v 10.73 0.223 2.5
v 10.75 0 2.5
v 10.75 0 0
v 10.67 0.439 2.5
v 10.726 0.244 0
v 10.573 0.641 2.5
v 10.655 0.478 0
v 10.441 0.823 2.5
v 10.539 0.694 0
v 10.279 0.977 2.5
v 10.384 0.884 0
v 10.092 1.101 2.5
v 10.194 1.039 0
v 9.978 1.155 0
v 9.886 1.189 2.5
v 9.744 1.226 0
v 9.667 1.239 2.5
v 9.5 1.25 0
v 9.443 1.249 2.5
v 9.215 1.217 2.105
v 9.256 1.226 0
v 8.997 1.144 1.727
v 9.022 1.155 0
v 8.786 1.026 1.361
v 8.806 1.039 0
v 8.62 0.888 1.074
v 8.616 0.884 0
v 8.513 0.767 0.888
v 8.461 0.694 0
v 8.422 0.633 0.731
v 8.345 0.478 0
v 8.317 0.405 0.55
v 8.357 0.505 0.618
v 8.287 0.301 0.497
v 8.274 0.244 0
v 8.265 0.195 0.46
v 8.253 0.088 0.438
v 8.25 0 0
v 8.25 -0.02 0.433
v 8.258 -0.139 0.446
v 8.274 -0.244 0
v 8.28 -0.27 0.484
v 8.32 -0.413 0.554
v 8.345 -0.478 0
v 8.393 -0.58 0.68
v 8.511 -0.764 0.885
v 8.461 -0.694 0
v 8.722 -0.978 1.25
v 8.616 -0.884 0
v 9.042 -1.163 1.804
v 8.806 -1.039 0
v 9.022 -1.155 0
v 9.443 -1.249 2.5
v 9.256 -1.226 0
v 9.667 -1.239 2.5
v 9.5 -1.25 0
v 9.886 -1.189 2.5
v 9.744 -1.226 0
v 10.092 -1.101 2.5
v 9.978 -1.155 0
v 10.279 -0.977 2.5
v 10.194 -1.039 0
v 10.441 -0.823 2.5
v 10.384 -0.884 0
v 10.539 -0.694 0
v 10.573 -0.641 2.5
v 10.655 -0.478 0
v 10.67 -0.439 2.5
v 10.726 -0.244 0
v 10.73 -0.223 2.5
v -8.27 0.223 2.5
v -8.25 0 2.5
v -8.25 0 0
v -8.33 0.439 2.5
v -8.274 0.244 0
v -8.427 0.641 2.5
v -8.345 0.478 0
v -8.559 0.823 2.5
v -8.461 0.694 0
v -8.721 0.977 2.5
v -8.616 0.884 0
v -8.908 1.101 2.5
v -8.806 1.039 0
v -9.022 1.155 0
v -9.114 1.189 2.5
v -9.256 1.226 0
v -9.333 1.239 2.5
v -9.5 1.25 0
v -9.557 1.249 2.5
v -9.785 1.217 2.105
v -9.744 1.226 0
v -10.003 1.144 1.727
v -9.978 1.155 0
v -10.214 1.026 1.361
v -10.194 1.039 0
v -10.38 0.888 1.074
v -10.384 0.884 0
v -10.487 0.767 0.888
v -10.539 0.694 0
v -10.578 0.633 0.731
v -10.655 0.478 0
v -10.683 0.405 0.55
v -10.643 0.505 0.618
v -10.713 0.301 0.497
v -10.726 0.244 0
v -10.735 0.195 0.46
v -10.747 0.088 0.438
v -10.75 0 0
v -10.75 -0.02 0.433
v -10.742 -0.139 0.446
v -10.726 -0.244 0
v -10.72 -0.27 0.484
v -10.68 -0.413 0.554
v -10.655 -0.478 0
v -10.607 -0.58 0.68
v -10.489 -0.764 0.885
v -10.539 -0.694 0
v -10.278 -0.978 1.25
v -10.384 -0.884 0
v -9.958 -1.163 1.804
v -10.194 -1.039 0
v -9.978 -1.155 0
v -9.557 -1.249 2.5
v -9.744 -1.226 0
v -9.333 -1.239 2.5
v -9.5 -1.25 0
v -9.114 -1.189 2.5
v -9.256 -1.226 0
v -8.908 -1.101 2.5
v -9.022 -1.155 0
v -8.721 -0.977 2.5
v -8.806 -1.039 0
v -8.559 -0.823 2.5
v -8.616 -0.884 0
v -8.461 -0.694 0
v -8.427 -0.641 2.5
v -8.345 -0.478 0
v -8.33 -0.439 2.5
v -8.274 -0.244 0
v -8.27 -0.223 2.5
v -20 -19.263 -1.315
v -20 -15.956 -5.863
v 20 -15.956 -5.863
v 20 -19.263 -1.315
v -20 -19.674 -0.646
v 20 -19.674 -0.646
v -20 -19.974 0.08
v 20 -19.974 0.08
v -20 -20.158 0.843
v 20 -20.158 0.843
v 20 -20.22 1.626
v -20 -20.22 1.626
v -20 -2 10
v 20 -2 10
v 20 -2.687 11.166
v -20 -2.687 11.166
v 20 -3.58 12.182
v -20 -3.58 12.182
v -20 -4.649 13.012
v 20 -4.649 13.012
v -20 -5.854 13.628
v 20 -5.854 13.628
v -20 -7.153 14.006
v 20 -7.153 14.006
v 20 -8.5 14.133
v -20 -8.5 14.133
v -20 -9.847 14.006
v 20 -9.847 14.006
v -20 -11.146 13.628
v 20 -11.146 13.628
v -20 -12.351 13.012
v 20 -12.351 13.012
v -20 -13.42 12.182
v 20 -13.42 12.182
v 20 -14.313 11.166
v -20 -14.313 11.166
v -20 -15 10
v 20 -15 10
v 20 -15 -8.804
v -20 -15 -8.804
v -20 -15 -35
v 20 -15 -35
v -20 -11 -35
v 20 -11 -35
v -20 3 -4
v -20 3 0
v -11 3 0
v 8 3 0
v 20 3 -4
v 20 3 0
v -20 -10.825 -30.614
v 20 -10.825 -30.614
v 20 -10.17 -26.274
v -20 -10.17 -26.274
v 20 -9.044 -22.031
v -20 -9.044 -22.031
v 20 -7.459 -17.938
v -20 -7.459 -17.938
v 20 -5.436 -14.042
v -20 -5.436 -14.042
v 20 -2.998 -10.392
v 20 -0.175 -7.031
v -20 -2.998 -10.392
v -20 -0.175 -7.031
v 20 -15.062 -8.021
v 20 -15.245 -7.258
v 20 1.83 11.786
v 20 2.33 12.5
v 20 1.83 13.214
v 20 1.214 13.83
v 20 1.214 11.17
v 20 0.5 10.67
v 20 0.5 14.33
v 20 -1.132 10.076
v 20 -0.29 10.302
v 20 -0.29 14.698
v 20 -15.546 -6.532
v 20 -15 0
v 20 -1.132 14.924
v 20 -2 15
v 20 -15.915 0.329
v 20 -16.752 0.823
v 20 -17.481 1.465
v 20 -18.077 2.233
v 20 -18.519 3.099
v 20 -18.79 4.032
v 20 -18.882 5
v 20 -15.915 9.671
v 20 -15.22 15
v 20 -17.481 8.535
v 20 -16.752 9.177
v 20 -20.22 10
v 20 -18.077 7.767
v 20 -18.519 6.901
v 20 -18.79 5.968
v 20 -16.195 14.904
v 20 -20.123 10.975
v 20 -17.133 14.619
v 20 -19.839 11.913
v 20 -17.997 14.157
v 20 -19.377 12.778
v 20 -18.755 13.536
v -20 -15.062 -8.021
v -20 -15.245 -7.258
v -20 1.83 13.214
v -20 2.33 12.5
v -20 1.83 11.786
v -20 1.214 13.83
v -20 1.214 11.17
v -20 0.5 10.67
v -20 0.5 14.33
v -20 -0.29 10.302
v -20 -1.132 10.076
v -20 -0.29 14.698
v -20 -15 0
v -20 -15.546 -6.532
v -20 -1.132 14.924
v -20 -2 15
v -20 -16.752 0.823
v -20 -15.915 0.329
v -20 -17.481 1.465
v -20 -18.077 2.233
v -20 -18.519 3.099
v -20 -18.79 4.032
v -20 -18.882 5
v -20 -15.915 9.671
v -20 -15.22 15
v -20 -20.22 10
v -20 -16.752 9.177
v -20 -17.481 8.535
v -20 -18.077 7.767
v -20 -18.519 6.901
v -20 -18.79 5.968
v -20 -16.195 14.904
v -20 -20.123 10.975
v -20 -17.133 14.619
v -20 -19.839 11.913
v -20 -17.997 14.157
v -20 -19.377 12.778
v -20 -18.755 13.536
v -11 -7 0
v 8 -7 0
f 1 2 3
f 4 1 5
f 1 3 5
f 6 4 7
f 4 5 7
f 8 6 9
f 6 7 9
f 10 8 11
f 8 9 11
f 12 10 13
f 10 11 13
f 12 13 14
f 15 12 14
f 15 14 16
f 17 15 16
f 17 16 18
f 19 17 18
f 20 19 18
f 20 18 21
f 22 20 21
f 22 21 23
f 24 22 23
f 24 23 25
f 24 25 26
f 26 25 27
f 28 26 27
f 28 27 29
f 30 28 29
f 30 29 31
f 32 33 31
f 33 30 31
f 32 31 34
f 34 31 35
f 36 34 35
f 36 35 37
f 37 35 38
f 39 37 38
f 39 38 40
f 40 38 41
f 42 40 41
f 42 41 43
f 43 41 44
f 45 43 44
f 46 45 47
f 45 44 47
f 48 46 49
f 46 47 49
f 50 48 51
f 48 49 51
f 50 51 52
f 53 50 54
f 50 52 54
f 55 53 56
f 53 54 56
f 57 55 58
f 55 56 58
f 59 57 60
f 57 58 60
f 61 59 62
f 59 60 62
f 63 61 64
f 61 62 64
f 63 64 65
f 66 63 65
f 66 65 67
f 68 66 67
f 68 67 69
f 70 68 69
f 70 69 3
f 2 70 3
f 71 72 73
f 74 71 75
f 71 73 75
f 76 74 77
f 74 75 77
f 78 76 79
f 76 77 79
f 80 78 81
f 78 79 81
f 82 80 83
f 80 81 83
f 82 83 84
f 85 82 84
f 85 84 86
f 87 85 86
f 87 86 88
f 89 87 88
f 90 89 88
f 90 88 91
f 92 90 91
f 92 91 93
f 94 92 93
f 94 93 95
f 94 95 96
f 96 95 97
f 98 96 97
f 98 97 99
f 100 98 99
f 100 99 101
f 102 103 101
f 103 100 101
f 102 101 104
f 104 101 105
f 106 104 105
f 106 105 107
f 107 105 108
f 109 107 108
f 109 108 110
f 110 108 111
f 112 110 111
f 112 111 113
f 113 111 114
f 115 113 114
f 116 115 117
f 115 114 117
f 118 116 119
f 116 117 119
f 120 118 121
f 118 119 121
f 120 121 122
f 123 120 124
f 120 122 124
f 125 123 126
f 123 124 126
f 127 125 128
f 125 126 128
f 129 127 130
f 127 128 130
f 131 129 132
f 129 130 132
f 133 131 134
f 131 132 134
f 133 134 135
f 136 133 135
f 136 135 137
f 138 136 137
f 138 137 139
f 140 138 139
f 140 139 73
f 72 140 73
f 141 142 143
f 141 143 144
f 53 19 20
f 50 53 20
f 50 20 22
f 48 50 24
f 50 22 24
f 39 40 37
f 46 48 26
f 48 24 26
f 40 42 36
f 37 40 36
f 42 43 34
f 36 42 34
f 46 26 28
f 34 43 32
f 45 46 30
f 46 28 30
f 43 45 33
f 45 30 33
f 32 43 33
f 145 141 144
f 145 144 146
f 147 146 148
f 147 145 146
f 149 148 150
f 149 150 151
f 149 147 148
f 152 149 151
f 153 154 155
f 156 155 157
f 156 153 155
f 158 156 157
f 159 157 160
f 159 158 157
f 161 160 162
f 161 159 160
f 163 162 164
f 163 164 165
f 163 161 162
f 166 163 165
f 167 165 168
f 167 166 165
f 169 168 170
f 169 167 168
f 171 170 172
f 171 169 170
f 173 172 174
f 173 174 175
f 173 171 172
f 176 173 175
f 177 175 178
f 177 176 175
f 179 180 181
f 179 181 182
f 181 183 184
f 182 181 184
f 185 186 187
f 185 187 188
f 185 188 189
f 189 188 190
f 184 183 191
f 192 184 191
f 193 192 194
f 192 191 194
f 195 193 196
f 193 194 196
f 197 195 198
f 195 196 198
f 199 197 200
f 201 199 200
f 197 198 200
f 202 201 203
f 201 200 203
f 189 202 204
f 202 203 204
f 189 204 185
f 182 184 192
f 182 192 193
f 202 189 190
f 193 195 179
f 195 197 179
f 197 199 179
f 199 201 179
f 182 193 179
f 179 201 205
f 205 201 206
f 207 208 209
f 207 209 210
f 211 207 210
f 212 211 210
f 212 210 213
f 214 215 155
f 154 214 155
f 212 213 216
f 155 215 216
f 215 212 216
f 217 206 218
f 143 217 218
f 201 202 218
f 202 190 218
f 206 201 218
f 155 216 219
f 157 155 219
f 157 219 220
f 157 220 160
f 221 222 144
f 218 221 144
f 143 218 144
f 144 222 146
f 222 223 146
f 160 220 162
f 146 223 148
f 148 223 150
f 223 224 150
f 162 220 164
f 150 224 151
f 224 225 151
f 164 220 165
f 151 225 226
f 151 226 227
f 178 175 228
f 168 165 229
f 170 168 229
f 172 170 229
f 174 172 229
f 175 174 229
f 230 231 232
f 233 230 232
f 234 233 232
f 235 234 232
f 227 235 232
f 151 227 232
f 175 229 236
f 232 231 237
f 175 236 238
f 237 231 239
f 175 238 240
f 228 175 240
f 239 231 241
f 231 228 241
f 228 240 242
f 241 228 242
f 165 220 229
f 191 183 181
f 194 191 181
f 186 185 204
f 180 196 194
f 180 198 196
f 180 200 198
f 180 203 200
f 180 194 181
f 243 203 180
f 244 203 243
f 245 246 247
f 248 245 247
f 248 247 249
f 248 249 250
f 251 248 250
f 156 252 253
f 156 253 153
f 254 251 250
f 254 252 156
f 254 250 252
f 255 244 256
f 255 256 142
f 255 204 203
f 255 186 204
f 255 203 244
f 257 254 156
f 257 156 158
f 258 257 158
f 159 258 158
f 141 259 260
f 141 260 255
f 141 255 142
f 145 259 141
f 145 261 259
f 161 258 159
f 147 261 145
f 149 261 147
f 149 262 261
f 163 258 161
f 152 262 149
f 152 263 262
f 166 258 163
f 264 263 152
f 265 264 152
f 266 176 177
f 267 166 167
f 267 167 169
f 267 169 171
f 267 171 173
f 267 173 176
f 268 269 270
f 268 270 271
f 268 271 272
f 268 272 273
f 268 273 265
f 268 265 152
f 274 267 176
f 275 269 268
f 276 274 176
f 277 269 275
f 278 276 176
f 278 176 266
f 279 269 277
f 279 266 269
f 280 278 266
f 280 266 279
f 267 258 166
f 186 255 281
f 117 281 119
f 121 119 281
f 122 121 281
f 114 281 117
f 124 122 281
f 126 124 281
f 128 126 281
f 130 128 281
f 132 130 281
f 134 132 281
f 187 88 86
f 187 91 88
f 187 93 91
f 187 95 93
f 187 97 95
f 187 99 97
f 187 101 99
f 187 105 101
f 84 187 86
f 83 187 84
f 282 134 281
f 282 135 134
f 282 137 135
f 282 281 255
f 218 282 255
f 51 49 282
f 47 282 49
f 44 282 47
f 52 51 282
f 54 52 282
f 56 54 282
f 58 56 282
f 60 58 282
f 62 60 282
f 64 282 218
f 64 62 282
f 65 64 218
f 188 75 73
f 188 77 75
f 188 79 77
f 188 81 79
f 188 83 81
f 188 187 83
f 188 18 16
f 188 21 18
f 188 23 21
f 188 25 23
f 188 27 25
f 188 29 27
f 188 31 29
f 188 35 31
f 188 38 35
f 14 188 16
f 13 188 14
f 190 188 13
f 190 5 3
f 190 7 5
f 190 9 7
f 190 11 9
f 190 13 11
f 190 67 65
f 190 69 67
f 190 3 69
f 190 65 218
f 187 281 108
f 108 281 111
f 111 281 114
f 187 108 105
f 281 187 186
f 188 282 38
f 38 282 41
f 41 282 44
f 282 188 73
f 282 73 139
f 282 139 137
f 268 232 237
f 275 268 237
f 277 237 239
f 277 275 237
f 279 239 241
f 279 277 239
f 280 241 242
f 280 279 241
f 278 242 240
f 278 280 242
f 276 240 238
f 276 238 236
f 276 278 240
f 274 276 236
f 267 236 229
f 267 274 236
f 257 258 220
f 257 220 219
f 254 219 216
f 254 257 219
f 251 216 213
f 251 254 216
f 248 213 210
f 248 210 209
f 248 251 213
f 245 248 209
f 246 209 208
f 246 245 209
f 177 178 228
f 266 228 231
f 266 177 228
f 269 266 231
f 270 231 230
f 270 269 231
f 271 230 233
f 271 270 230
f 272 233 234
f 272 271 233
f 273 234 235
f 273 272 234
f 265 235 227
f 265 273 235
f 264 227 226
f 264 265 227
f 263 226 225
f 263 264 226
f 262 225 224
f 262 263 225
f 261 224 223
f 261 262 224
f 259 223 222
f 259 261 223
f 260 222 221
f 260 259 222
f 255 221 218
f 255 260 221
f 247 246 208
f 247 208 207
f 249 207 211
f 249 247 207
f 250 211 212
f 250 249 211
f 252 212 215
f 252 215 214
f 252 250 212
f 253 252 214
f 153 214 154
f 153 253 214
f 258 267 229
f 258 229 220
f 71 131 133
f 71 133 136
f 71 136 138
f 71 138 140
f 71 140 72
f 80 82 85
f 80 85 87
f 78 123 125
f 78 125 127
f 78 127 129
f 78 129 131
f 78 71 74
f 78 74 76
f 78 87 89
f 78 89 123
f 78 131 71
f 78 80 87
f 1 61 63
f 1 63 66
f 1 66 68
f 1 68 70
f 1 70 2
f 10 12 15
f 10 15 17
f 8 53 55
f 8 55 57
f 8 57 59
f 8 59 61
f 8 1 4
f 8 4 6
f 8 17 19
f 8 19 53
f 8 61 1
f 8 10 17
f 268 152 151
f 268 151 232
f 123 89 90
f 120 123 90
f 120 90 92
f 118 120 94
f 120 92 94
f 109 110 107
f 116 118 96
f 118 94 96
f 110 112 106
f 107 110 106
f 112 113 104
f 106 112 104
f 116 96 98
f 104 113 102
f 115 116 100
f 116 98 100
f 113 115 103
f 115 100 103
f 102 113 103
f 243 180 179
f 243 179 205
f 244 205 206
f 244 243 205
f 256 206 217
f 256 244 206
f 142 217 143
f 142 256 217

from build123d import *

# Parameters (mm, degrees)
F0_R         = 1.25
F1_DEPTH     = 2.5
F2_W         = 40
F2_H         = 18
F3_DEPTH     = 35
F5_DEPTH     = 40.001
F7_DEPTH     = 40
F9_DEPTH     = 10
F10_T1_DEPTH = 40
F10_T3_DEPTH = 65
F10_T5_DEPTH = 48.1285235511


# Not quite as in the source:
# - a fillet or chamfer that OpenCascade refuses, or shapes differently, is made with other operations: its cross-section is extruded or revolved along the edge and cut away or added


with BuildPart() as f1:
    # F0 (on Top) → F1 (new body)
    with BuildSketch(Plane.XY):
        with Locations((-9.5, 0)):
            Circle(F0_R)
    extrude(amount=F1_DEPTH)



with BuildPart() as f1b:
    # F0 (on Top) → F1, piece 2 (new body)
    with BuildSketch(Plane.XY):
        with Locations((9.5, 0)):
            Circle(F0_R)
    extrude(amount=F1_DEPTH)


with BuildPart() as f1_1:
    add(f1.part)

    add(f1b.part)  # F3 merges F1b
    # F2 (on Top) → F3 (join)
    with BuildSketch(Plane.XY):
        with Locations((0, -6)):
            Rectangle(F2_W, F2_H)
    extrude(amount=-F3_DEPTH)

    # F4 (on face) → F5 (cut, through all)
    with BuildSketch(Plane(origin=(-20, 0, 0), x_dir=(0, -1, 0), z_dir=(-1, 0, 0))):
        with BuildLine():
            Line((-3, -35), (11, -35))
            ThreePointArc((11, -35), (7.459306232, -17.9377326694), (-3, -4))
            Line((-3, -4), (-3, -35))
        make_face()
    extrude(amount=-F5_DEPTH, mode=Mode.SUBTRACT)

    # F6 (on face) → F7 (join)
    with BuildSketch(Plane(origin=(-20, 0, 0), x_dir=(0, -1, 0), z_dir=(-1, 0, 0))):
        with BuildLine():
            Line((-3, 10), (2, 10))
            ThreePointArc((2, 10), (8.5, 14.1331594945), (15, 10))
            ThreePointArc((15, 10), (18.881651405, 5), (15, 0))
            Line((15, 0), (15, -7.1779969148))
            Line((15, -7.1779969148), (20.2195104212, 0))
            Line((20.2195104212, 0), (20.2195104212, 15))
            Line((20.2195104212, 15), (-3, 15))
            Line((-3, 15), (-3, 10))
        make_face()
    extrude(amount=-F7_DEPTH)

    # F8 (on face) → F9 (cut)
    with BuildSketch(Plane(origin=(0, 3, 0), x_dir=(-1, 0, 0), z_dir=(0, 1, 0))):
        Polygon((9.1120566488, 3.2700138061), (11, 0), (11, 3.2700138061), align=None)
        Polygon((-9.8879433512, 3.2700138061), (-8, 0), (-8, 3.2700138061), align=None)
    extrude(amount=-F9_DEPTH, mode=Mode.SUBTRACT)

    # F10: fillet of radius 5 on 5 edges, made by hand

    # F10_s2 → F10_t1 (join)
    with BuildSketch(Plane.YZ.offset(-20)):
        with BuildLine():
            ThreePointArc((-15, -8.803701625), (-15.245026694, -7.257665125), (-15.9560915438, -5.8631567099))
            Line((-15.9560915438, -5.8631567099), (-15, -7.1779969148))
            Line((-15, -7.1779969148), (-15, -8.803701625))
        make_face()
    extrude(amount=F10_T1_DEPTH)

    # F10_s4 → F10_t3 (cut)
    with BuildSketch(Plane.YZ.offset(-32.5)):
        with BuildLine():
            ThreePointArc((-20.2195104212, 10), (-18.7550443271, 13.5355339059), (-15.2195104212, 15))
            Line((-15.2195104212, 15), (-20.2195104212, 15))
            Line((-20.2195104212, 15), (-20.2195104212, 10))
        make_face()
        with BuildLine():
            ThreePointArc((-2, 15), (1.5355339059, 13.5355339059), (3, 10))
            Line((3, 10), (3, 15))
            Line((3, 15), (-2, 15))
        make_face()
        with BuildLine():
            ThreePointArc((3, 15), (1.5355339059, 11.4644660941), (-2, 10))
            Line((-2, 10), (3, 10))
            Line((3, 10), (3, 15))
        make_face()
    extrude(amount=F10_T3_DEPTH, mode=Mode.SUBTRACT)

    # F10_s6 → F10_t5 (cut)
    with BuildSketch(Plane.YZ.offset(-24.0642617755)):
        with BuildLine():
            ThreePointArc((-19.2634188773, -1.314840205), (-19.9744837271, 0.0796682101), (-20.2195104212, 1.6257047102))
            Line((-20.2195104212, 1.6257047102), (-20.2195104212, 0))
            Line((-20.2195104212, 0), (-19.2634188773, -1.314840205))
        make_face()
    extrude(amount=F10_T5_DEPTH, mode=Mode.SUBTRACT)


solid = f1_1.part
